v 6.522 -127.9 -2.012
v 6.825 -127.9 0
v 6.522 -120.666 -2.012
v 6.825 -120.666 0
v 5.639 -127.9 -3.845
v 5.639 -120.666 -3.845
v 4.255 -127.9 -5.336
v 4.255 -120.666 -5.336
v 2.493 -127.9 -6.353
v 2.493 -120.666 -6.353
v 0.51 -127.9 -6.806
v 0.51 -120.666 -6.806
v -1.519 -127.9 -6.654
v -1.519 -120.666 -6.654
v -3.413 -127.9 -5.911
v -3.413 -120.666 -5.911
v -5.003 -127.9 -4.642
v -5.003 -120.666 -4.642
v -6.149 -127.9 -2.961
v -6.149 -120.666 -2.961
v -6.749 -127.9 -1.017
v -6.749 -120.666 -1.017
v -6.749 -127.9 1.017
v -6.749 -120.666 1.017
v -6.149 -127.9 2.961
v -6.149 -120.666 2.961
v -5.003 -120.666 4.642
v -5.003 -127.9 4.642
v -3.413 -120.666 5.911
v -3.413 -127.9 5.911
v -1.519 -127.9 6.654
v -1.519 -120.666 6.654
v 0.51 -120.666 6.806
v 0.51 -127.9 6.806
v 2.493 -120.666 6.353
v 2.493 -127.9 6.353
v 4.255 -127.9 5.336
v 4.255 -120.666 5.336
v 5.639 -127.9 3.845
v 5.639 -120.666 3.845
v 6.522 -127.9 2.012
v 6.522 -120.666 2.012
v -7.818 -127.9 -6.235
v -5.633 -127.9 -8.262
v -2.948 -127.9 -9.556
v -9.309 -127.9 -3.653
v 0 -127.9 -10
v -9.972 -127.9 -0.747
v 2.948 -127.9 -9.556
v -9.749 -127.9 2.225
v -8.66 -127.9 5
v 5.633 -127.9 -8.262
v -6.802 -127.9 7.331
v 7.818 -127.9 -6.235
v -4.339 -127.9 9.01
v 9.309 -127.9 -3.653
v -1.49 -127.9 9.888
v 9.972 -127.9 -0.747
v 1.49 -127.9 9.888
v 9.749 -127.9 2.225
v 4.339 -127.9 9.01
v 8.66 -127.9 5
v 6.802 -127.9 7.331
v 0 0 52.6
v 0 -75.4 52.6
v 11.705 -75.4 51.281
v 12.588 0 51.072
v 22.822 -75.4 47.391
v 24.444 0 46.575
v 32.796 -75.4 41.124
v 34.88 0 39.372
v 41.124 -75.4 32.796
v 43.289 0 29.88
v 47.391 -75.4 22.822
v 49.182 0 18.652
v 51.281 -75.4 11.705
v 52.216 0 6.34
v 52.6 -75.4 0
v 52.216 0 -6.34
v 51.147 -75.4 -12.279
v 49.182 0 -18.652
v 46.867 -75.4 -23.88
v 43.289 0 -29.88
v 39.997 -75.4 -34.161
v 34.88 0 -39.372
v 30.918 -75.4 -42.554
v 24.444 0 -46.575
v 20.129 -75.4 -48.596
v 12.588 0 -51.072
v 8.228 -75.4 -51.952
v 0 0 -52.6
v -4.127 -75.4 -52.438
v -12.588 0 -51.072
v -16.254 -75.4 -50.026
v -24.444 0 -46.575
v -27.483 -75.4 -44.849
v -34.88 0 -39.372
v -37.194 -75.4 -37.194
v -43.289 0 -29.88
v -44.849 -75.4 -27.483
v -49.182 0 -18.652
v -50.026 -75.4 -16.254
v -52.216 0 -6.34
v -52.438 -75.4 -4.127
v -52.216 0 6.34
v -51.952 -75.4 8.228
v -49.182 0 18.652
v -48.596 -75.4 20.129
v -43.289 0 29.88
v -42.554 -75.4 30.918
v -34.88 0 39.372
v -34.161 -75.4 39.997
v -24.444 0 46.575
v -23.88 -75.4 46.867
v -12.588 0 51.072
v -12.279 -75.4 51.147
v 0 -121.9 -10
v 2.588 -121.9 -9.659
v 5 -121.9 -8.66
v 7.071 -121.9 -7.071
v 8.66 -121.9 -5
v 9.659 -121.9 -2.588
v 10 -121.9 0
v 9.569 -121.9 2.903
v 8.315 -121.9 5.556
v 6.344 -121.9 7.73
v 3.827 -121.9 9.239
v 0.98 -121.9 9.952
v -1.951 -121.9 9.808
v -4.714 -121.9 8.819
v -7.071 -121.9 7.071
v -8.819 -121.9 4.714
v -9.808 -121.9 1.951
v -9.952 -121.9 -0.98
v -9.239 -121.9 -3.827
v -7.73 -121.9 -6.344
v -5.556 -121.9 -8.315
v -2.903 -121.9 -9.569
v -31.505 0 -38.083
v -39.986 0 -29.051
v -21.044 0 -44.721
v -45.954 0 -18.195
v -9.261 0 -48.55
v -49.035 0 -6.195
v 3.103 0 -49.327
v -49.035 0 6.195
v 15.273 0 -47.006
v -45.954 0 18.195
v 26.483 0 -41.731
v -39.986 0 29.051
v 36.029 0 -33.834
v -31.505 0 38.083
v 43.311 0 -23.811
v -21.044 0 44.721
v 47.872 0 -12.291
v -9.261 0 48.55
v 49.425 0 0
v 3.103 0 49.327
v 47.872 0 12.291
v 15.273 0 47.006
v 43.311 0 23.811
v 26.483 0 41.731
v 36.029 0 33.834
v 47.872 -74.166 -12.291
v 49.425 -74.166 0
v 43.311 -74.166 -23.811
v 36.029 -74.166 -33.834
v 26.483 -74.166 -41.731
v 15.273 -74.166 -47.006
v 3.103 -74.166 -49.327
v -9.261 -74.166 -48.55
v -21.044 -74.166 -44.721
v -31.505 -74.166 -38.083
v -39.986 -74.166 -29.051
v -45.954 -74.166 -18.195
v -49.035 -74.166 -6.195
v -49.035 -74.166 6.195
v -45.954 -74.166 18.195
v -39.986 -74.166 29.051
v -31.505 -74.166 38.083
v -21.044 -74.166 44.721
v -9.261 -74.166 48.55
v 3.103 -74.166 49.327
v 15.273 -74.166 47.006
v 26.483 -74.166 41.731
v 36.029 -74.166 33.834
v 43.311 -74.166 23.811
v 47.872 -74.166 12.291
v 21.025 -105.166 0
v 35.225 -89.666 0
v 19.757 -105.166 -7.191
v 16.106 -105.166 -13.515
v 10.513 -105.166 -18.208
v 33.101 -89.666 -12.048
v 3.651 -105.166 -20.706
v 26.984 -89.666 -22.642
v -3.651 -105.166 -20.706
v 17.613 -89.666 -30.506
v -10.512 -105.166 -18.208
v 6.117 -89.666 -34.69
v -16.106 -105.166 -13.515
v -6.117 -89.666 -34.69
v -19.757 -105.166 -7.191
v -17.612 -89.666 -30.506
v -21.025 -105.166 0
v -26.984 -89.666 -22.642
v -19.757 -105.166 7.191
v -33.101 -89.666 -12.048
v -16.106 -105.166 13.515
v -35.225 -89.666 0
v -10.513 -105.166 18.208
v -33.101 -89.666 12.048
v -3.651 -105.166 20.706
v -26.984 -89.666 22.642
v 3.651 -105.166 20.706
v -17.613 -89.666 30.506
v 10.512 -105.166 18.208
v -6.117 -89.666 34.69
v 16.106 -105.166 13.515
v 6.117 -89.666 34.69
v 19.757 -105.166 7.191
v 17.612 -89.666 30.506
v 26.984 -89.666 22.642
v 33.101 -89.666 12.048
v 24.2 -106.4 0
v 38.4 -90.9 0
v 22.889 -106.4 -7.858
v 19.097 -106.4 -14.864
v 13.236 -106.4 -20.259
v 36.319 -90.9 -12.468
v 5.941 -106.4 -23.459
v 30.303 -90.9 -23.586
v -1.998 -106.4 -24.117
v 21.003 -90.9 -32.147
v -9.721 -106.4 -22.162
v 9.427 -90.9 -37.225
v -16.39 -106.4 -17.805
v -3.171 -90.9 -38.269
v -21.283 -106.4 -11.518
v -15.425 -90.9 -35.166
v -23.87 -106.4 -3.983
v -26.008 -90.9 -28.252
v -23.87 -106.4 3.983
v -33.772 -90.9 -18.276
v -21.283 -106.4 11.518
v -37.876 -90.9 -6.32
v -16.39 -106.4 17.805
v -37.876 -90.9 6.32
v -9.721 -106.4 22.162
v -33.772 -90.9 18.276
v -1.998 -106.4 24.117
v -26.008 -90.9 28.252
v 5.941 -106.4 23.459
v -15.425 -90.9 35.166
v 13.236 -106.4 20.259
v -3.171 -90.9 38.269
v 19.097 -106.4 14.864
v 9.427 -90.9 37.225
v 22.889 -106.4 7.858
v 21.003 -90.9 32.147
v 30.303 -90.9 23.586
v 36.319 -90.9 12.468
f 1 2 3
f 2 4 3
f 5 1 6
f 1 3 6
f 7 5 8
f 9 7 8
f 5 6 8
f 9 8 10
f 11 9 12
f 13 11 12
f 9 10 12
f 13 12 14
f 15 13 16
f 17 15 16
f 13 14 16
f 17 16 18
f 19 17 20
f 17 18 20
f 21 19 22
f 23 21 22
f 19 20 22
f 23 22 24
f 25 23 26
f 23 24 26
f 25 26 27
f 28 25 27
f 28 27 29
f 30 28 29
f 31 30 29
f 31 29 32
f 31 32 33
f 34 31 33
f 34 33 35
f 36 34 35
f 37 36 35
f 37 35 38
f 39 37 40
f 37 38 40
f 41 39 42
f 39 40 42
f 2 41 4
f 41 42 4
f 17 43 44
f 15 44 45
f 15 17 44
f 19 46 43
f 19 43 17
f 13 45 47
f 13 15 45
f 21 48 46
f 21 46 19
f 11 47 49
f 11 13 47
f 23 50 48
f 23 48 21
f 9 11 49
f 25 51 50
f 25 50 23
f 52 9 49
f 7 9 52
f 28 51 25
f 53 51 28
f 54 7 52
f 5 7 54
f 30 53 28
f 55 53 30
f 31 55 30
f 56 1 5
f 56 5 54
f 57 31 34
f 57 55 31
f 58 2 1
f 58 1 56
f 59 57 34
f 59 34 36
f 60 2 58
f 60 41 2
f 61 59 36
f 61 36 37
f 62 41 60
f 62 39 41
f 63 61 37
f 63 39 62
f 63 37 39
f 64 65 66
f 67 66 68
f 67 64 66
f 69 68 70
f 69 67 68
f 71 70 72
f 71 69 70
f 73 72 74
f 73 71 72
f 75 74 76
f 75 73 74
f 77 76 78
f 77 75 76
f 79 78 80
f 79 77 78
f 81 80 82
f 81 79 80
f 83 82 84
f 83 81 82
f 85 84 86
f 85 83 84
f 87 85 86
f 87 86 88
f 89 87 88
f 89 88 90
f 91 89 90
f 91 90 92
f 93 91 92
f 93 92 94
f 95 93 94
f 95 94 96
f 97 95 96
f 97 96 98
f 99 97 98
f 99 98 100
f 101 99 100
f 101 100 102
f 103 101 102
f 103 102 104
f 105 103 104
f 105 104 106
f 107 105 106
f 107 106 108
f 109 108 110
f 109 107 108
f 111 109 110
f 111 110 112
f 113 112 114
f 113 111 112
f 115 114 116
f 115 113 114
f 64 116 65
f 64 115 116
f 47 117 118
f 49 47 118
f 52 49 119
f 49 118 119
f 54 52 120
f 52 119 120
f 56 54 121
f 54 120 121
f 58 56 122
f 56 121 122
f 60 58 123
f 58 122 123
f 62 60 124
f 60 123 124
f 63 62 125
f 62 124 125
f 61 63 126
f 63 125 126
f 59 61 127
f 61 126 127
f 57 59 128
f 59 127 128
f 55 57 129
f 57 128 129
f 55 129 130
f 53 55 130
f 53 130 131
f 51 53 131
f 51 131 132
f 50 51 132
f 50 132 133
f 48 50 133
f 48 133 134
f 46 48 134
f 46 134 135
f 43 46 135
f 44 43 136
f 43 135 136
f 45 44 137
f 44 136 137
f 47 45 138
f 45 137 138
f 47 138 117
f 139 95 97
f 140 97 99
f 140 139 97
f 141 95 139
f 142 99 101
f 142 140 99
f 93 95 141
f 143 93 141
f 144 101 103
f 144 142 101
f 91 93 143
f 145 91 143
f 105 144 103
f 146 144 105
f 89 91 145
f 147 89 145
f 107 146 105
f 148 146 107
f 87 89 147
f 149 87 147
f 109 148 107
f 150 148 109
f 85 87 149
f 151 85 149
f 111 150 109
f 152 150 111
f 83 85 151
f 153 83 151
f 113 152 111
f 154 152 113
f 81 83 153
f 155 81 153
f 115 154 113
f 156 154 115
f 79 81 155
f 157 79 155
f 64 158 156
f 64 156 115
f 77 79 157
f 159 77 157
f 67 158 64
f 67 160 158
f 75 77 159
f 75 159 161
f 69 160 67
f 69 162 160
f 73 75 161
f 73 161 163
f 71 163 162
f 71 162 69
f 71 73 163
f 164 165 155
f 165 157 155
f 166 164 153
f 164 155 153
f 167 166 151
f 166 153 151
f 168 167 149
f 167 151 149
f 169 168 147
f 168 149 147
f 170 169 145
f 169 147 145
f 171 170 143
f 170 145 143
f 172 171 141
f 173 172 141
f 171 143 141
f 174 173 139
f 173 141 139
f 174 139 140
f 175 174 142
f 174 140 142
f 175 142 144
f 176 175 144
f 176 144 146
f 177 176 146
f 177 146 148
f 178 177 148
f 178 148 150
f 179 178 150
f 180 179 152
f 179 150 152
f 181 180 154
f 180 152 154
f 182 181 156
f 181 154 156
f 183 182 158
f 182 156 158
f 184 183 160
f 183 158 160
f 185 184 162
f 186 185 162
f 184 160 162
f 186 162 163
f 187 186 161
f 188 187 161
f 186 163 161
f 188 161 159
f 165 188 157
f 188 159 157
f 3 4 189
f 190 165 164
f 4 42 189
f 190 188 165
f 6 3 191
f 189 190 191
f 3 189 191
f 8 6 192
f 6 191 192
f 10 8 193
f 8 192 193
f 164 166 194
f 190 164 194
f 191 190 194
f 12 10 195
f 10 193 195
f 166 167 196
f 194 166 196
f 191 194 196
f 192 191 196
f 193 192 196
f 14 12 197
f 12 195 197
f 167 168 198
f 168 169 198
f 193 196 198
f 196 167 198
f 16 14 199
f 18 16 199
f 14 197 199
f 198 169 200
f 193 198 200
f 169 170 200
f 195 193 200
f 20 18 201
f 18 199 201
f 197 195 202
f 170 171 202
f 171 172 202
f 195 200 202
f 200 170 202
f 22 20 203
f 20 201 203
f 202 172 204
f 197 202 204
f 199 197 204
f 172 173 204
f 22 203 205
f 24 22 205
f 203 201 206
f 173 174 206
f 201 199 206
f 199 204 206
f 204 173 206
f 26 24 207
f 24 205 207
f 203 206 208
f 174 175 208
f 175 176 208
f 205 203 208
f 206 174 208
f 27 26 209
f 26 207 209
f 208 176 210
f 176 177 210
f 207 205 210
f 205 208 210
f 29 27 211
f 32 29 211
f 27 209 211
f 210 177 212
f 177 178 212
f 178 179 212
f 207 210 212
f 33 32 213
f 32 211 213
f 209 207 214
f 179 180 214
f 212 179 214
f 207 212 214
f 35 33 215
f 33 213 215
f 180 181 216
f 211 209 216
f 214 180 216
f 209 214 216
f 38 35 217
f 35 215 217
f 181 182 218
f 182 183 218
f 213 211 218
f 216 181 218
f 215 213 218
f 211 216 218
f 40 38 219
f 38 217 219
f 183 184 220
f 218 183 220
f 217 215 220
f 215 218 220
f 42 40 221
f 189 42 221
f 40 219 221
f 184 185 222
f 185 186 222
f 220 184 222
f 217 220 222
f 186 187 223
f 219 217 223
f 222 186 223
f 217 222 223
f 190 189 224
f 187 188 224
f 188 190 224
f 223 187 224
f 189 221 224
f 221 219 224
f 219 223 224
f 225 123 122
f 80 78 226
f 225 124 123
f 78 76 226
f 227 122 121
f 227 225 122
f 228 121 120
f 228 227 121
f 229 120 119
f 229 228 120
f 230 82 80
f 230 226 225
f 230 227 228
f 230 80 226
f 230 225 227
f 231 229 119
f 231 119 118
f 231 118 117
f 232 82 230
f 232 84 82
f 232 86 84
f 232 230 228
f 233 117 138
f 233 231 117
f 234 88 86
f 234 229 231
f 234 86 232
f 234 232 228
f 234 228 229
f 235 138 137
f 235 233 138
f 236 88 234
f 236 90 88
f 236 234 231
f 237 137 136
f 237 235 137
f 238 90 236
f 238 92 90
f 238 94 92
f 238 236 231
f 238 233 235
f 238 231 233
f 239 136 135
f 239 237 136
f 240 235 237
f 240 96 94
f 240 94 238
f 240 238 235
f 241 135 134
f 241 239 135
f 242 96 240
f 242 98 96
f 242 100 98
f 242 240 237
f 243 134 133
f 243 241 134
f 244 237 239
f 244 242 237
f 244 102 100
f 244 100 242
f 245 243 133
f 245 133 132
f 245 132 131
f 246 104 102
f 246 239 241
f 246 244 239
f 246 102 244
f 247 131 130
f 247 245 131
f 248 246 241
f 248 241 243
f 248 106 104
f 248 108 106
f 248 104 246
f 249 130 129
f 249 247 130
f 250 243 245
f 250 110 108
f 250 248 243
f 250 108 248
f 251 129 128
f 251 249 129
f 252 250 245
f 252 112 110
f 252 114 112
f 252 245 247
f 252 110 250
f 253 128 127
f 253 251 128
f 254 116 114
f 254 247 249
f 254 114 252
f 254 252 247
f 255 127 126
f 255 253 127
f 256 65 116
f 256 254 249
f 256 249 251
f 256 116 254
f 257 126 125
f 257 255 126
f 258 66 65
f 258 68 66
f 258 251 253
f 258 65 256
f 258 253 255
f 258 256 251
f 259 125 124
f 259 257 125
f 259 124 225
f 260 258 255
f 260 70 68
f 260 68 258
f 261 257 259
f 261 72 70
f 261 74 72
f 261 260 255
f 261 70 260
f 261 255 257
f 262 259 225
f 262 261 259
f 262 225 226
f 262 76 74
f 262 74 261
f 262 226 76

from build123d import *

# Parameters (mm, degrees)
CROQUIS1_R              = 52.6
SALIENTE_EXTRUIR1_DEPTH = 75.4
CROQUIS3_R              = 10
CROQUIS2_R              = 52.6
CROQUIS4_R              = 10
SALIENTE_EXTRUIR2_DEPTH = 30
CROQUIS7_R              = 17.5
CORTAR_EXTRUIR2_DEPTH   = 24


# Read off the part's stored shape, not the designer's step: Vaciado2
with BuildPart() as part:
    # Croquis1 → Saliente-Extruir1 (new body)
    with BuildSketch(Plane(origin=(0, 0, 0), x_dir=(1, 0, 0), z_dir=(0, 1, 0))):
        with Locations(Location((0, 0, 0), (0, 0, 270))):
            Circle(CROQUIS1_R)
    extrude(amount=-SALIENTE_EXTRUIR1_DEPTH)

    # Croquis3 → Recubrir1 section 0
    with BuildSketch(Plane(origin=(0, -121.9, 0), x_dir=(1, 0, 0), z_dir=(0, 1, 0))):
        Circle(CROQUIS3_R)
    # Croquis2 → Recubrir1 section 1
    with BuildSketch(Plane.XZ.offset(75.4)):
        Circle(CROQUIS2_R)
    loft()

    # Croquis4 → Saliente-Extruir2 (add)
    with BuildSketch(Plane.XZ.offset(121.9)):
        with Locations(Location((0, 0, 0), (0, 0, 270))):
            Circle(CROQUIS4_R)
    extrude(amount=SALIENTE_EXTRUIR2_DEPTH)

    # Croquis7 → Cortar-Extruir2 (cut)
    with BuildSketch(Plane.XZ.offset(151.9)):
        Circle(CROQUIS7_R)
    extrude(amount=-CORTAR_EXTRUIR2_DEPTH, mode=Mode.SUBTRACT)

    # Vaciado2 outline → Vaciado2 (revolve, cut)
    with BuildSketch(Plane.XY):
        Polygon((0, -127.9), (6.825, -127.9), (6.825, -120.665510856), (49.425, -74.165510856), (49.425, 0), (0, 0), align=None)
    revolve(axis=Axis((0, 0, 0), (0, 1, 0)), mode=Mode.SUBTRACT)


solid = part.part
